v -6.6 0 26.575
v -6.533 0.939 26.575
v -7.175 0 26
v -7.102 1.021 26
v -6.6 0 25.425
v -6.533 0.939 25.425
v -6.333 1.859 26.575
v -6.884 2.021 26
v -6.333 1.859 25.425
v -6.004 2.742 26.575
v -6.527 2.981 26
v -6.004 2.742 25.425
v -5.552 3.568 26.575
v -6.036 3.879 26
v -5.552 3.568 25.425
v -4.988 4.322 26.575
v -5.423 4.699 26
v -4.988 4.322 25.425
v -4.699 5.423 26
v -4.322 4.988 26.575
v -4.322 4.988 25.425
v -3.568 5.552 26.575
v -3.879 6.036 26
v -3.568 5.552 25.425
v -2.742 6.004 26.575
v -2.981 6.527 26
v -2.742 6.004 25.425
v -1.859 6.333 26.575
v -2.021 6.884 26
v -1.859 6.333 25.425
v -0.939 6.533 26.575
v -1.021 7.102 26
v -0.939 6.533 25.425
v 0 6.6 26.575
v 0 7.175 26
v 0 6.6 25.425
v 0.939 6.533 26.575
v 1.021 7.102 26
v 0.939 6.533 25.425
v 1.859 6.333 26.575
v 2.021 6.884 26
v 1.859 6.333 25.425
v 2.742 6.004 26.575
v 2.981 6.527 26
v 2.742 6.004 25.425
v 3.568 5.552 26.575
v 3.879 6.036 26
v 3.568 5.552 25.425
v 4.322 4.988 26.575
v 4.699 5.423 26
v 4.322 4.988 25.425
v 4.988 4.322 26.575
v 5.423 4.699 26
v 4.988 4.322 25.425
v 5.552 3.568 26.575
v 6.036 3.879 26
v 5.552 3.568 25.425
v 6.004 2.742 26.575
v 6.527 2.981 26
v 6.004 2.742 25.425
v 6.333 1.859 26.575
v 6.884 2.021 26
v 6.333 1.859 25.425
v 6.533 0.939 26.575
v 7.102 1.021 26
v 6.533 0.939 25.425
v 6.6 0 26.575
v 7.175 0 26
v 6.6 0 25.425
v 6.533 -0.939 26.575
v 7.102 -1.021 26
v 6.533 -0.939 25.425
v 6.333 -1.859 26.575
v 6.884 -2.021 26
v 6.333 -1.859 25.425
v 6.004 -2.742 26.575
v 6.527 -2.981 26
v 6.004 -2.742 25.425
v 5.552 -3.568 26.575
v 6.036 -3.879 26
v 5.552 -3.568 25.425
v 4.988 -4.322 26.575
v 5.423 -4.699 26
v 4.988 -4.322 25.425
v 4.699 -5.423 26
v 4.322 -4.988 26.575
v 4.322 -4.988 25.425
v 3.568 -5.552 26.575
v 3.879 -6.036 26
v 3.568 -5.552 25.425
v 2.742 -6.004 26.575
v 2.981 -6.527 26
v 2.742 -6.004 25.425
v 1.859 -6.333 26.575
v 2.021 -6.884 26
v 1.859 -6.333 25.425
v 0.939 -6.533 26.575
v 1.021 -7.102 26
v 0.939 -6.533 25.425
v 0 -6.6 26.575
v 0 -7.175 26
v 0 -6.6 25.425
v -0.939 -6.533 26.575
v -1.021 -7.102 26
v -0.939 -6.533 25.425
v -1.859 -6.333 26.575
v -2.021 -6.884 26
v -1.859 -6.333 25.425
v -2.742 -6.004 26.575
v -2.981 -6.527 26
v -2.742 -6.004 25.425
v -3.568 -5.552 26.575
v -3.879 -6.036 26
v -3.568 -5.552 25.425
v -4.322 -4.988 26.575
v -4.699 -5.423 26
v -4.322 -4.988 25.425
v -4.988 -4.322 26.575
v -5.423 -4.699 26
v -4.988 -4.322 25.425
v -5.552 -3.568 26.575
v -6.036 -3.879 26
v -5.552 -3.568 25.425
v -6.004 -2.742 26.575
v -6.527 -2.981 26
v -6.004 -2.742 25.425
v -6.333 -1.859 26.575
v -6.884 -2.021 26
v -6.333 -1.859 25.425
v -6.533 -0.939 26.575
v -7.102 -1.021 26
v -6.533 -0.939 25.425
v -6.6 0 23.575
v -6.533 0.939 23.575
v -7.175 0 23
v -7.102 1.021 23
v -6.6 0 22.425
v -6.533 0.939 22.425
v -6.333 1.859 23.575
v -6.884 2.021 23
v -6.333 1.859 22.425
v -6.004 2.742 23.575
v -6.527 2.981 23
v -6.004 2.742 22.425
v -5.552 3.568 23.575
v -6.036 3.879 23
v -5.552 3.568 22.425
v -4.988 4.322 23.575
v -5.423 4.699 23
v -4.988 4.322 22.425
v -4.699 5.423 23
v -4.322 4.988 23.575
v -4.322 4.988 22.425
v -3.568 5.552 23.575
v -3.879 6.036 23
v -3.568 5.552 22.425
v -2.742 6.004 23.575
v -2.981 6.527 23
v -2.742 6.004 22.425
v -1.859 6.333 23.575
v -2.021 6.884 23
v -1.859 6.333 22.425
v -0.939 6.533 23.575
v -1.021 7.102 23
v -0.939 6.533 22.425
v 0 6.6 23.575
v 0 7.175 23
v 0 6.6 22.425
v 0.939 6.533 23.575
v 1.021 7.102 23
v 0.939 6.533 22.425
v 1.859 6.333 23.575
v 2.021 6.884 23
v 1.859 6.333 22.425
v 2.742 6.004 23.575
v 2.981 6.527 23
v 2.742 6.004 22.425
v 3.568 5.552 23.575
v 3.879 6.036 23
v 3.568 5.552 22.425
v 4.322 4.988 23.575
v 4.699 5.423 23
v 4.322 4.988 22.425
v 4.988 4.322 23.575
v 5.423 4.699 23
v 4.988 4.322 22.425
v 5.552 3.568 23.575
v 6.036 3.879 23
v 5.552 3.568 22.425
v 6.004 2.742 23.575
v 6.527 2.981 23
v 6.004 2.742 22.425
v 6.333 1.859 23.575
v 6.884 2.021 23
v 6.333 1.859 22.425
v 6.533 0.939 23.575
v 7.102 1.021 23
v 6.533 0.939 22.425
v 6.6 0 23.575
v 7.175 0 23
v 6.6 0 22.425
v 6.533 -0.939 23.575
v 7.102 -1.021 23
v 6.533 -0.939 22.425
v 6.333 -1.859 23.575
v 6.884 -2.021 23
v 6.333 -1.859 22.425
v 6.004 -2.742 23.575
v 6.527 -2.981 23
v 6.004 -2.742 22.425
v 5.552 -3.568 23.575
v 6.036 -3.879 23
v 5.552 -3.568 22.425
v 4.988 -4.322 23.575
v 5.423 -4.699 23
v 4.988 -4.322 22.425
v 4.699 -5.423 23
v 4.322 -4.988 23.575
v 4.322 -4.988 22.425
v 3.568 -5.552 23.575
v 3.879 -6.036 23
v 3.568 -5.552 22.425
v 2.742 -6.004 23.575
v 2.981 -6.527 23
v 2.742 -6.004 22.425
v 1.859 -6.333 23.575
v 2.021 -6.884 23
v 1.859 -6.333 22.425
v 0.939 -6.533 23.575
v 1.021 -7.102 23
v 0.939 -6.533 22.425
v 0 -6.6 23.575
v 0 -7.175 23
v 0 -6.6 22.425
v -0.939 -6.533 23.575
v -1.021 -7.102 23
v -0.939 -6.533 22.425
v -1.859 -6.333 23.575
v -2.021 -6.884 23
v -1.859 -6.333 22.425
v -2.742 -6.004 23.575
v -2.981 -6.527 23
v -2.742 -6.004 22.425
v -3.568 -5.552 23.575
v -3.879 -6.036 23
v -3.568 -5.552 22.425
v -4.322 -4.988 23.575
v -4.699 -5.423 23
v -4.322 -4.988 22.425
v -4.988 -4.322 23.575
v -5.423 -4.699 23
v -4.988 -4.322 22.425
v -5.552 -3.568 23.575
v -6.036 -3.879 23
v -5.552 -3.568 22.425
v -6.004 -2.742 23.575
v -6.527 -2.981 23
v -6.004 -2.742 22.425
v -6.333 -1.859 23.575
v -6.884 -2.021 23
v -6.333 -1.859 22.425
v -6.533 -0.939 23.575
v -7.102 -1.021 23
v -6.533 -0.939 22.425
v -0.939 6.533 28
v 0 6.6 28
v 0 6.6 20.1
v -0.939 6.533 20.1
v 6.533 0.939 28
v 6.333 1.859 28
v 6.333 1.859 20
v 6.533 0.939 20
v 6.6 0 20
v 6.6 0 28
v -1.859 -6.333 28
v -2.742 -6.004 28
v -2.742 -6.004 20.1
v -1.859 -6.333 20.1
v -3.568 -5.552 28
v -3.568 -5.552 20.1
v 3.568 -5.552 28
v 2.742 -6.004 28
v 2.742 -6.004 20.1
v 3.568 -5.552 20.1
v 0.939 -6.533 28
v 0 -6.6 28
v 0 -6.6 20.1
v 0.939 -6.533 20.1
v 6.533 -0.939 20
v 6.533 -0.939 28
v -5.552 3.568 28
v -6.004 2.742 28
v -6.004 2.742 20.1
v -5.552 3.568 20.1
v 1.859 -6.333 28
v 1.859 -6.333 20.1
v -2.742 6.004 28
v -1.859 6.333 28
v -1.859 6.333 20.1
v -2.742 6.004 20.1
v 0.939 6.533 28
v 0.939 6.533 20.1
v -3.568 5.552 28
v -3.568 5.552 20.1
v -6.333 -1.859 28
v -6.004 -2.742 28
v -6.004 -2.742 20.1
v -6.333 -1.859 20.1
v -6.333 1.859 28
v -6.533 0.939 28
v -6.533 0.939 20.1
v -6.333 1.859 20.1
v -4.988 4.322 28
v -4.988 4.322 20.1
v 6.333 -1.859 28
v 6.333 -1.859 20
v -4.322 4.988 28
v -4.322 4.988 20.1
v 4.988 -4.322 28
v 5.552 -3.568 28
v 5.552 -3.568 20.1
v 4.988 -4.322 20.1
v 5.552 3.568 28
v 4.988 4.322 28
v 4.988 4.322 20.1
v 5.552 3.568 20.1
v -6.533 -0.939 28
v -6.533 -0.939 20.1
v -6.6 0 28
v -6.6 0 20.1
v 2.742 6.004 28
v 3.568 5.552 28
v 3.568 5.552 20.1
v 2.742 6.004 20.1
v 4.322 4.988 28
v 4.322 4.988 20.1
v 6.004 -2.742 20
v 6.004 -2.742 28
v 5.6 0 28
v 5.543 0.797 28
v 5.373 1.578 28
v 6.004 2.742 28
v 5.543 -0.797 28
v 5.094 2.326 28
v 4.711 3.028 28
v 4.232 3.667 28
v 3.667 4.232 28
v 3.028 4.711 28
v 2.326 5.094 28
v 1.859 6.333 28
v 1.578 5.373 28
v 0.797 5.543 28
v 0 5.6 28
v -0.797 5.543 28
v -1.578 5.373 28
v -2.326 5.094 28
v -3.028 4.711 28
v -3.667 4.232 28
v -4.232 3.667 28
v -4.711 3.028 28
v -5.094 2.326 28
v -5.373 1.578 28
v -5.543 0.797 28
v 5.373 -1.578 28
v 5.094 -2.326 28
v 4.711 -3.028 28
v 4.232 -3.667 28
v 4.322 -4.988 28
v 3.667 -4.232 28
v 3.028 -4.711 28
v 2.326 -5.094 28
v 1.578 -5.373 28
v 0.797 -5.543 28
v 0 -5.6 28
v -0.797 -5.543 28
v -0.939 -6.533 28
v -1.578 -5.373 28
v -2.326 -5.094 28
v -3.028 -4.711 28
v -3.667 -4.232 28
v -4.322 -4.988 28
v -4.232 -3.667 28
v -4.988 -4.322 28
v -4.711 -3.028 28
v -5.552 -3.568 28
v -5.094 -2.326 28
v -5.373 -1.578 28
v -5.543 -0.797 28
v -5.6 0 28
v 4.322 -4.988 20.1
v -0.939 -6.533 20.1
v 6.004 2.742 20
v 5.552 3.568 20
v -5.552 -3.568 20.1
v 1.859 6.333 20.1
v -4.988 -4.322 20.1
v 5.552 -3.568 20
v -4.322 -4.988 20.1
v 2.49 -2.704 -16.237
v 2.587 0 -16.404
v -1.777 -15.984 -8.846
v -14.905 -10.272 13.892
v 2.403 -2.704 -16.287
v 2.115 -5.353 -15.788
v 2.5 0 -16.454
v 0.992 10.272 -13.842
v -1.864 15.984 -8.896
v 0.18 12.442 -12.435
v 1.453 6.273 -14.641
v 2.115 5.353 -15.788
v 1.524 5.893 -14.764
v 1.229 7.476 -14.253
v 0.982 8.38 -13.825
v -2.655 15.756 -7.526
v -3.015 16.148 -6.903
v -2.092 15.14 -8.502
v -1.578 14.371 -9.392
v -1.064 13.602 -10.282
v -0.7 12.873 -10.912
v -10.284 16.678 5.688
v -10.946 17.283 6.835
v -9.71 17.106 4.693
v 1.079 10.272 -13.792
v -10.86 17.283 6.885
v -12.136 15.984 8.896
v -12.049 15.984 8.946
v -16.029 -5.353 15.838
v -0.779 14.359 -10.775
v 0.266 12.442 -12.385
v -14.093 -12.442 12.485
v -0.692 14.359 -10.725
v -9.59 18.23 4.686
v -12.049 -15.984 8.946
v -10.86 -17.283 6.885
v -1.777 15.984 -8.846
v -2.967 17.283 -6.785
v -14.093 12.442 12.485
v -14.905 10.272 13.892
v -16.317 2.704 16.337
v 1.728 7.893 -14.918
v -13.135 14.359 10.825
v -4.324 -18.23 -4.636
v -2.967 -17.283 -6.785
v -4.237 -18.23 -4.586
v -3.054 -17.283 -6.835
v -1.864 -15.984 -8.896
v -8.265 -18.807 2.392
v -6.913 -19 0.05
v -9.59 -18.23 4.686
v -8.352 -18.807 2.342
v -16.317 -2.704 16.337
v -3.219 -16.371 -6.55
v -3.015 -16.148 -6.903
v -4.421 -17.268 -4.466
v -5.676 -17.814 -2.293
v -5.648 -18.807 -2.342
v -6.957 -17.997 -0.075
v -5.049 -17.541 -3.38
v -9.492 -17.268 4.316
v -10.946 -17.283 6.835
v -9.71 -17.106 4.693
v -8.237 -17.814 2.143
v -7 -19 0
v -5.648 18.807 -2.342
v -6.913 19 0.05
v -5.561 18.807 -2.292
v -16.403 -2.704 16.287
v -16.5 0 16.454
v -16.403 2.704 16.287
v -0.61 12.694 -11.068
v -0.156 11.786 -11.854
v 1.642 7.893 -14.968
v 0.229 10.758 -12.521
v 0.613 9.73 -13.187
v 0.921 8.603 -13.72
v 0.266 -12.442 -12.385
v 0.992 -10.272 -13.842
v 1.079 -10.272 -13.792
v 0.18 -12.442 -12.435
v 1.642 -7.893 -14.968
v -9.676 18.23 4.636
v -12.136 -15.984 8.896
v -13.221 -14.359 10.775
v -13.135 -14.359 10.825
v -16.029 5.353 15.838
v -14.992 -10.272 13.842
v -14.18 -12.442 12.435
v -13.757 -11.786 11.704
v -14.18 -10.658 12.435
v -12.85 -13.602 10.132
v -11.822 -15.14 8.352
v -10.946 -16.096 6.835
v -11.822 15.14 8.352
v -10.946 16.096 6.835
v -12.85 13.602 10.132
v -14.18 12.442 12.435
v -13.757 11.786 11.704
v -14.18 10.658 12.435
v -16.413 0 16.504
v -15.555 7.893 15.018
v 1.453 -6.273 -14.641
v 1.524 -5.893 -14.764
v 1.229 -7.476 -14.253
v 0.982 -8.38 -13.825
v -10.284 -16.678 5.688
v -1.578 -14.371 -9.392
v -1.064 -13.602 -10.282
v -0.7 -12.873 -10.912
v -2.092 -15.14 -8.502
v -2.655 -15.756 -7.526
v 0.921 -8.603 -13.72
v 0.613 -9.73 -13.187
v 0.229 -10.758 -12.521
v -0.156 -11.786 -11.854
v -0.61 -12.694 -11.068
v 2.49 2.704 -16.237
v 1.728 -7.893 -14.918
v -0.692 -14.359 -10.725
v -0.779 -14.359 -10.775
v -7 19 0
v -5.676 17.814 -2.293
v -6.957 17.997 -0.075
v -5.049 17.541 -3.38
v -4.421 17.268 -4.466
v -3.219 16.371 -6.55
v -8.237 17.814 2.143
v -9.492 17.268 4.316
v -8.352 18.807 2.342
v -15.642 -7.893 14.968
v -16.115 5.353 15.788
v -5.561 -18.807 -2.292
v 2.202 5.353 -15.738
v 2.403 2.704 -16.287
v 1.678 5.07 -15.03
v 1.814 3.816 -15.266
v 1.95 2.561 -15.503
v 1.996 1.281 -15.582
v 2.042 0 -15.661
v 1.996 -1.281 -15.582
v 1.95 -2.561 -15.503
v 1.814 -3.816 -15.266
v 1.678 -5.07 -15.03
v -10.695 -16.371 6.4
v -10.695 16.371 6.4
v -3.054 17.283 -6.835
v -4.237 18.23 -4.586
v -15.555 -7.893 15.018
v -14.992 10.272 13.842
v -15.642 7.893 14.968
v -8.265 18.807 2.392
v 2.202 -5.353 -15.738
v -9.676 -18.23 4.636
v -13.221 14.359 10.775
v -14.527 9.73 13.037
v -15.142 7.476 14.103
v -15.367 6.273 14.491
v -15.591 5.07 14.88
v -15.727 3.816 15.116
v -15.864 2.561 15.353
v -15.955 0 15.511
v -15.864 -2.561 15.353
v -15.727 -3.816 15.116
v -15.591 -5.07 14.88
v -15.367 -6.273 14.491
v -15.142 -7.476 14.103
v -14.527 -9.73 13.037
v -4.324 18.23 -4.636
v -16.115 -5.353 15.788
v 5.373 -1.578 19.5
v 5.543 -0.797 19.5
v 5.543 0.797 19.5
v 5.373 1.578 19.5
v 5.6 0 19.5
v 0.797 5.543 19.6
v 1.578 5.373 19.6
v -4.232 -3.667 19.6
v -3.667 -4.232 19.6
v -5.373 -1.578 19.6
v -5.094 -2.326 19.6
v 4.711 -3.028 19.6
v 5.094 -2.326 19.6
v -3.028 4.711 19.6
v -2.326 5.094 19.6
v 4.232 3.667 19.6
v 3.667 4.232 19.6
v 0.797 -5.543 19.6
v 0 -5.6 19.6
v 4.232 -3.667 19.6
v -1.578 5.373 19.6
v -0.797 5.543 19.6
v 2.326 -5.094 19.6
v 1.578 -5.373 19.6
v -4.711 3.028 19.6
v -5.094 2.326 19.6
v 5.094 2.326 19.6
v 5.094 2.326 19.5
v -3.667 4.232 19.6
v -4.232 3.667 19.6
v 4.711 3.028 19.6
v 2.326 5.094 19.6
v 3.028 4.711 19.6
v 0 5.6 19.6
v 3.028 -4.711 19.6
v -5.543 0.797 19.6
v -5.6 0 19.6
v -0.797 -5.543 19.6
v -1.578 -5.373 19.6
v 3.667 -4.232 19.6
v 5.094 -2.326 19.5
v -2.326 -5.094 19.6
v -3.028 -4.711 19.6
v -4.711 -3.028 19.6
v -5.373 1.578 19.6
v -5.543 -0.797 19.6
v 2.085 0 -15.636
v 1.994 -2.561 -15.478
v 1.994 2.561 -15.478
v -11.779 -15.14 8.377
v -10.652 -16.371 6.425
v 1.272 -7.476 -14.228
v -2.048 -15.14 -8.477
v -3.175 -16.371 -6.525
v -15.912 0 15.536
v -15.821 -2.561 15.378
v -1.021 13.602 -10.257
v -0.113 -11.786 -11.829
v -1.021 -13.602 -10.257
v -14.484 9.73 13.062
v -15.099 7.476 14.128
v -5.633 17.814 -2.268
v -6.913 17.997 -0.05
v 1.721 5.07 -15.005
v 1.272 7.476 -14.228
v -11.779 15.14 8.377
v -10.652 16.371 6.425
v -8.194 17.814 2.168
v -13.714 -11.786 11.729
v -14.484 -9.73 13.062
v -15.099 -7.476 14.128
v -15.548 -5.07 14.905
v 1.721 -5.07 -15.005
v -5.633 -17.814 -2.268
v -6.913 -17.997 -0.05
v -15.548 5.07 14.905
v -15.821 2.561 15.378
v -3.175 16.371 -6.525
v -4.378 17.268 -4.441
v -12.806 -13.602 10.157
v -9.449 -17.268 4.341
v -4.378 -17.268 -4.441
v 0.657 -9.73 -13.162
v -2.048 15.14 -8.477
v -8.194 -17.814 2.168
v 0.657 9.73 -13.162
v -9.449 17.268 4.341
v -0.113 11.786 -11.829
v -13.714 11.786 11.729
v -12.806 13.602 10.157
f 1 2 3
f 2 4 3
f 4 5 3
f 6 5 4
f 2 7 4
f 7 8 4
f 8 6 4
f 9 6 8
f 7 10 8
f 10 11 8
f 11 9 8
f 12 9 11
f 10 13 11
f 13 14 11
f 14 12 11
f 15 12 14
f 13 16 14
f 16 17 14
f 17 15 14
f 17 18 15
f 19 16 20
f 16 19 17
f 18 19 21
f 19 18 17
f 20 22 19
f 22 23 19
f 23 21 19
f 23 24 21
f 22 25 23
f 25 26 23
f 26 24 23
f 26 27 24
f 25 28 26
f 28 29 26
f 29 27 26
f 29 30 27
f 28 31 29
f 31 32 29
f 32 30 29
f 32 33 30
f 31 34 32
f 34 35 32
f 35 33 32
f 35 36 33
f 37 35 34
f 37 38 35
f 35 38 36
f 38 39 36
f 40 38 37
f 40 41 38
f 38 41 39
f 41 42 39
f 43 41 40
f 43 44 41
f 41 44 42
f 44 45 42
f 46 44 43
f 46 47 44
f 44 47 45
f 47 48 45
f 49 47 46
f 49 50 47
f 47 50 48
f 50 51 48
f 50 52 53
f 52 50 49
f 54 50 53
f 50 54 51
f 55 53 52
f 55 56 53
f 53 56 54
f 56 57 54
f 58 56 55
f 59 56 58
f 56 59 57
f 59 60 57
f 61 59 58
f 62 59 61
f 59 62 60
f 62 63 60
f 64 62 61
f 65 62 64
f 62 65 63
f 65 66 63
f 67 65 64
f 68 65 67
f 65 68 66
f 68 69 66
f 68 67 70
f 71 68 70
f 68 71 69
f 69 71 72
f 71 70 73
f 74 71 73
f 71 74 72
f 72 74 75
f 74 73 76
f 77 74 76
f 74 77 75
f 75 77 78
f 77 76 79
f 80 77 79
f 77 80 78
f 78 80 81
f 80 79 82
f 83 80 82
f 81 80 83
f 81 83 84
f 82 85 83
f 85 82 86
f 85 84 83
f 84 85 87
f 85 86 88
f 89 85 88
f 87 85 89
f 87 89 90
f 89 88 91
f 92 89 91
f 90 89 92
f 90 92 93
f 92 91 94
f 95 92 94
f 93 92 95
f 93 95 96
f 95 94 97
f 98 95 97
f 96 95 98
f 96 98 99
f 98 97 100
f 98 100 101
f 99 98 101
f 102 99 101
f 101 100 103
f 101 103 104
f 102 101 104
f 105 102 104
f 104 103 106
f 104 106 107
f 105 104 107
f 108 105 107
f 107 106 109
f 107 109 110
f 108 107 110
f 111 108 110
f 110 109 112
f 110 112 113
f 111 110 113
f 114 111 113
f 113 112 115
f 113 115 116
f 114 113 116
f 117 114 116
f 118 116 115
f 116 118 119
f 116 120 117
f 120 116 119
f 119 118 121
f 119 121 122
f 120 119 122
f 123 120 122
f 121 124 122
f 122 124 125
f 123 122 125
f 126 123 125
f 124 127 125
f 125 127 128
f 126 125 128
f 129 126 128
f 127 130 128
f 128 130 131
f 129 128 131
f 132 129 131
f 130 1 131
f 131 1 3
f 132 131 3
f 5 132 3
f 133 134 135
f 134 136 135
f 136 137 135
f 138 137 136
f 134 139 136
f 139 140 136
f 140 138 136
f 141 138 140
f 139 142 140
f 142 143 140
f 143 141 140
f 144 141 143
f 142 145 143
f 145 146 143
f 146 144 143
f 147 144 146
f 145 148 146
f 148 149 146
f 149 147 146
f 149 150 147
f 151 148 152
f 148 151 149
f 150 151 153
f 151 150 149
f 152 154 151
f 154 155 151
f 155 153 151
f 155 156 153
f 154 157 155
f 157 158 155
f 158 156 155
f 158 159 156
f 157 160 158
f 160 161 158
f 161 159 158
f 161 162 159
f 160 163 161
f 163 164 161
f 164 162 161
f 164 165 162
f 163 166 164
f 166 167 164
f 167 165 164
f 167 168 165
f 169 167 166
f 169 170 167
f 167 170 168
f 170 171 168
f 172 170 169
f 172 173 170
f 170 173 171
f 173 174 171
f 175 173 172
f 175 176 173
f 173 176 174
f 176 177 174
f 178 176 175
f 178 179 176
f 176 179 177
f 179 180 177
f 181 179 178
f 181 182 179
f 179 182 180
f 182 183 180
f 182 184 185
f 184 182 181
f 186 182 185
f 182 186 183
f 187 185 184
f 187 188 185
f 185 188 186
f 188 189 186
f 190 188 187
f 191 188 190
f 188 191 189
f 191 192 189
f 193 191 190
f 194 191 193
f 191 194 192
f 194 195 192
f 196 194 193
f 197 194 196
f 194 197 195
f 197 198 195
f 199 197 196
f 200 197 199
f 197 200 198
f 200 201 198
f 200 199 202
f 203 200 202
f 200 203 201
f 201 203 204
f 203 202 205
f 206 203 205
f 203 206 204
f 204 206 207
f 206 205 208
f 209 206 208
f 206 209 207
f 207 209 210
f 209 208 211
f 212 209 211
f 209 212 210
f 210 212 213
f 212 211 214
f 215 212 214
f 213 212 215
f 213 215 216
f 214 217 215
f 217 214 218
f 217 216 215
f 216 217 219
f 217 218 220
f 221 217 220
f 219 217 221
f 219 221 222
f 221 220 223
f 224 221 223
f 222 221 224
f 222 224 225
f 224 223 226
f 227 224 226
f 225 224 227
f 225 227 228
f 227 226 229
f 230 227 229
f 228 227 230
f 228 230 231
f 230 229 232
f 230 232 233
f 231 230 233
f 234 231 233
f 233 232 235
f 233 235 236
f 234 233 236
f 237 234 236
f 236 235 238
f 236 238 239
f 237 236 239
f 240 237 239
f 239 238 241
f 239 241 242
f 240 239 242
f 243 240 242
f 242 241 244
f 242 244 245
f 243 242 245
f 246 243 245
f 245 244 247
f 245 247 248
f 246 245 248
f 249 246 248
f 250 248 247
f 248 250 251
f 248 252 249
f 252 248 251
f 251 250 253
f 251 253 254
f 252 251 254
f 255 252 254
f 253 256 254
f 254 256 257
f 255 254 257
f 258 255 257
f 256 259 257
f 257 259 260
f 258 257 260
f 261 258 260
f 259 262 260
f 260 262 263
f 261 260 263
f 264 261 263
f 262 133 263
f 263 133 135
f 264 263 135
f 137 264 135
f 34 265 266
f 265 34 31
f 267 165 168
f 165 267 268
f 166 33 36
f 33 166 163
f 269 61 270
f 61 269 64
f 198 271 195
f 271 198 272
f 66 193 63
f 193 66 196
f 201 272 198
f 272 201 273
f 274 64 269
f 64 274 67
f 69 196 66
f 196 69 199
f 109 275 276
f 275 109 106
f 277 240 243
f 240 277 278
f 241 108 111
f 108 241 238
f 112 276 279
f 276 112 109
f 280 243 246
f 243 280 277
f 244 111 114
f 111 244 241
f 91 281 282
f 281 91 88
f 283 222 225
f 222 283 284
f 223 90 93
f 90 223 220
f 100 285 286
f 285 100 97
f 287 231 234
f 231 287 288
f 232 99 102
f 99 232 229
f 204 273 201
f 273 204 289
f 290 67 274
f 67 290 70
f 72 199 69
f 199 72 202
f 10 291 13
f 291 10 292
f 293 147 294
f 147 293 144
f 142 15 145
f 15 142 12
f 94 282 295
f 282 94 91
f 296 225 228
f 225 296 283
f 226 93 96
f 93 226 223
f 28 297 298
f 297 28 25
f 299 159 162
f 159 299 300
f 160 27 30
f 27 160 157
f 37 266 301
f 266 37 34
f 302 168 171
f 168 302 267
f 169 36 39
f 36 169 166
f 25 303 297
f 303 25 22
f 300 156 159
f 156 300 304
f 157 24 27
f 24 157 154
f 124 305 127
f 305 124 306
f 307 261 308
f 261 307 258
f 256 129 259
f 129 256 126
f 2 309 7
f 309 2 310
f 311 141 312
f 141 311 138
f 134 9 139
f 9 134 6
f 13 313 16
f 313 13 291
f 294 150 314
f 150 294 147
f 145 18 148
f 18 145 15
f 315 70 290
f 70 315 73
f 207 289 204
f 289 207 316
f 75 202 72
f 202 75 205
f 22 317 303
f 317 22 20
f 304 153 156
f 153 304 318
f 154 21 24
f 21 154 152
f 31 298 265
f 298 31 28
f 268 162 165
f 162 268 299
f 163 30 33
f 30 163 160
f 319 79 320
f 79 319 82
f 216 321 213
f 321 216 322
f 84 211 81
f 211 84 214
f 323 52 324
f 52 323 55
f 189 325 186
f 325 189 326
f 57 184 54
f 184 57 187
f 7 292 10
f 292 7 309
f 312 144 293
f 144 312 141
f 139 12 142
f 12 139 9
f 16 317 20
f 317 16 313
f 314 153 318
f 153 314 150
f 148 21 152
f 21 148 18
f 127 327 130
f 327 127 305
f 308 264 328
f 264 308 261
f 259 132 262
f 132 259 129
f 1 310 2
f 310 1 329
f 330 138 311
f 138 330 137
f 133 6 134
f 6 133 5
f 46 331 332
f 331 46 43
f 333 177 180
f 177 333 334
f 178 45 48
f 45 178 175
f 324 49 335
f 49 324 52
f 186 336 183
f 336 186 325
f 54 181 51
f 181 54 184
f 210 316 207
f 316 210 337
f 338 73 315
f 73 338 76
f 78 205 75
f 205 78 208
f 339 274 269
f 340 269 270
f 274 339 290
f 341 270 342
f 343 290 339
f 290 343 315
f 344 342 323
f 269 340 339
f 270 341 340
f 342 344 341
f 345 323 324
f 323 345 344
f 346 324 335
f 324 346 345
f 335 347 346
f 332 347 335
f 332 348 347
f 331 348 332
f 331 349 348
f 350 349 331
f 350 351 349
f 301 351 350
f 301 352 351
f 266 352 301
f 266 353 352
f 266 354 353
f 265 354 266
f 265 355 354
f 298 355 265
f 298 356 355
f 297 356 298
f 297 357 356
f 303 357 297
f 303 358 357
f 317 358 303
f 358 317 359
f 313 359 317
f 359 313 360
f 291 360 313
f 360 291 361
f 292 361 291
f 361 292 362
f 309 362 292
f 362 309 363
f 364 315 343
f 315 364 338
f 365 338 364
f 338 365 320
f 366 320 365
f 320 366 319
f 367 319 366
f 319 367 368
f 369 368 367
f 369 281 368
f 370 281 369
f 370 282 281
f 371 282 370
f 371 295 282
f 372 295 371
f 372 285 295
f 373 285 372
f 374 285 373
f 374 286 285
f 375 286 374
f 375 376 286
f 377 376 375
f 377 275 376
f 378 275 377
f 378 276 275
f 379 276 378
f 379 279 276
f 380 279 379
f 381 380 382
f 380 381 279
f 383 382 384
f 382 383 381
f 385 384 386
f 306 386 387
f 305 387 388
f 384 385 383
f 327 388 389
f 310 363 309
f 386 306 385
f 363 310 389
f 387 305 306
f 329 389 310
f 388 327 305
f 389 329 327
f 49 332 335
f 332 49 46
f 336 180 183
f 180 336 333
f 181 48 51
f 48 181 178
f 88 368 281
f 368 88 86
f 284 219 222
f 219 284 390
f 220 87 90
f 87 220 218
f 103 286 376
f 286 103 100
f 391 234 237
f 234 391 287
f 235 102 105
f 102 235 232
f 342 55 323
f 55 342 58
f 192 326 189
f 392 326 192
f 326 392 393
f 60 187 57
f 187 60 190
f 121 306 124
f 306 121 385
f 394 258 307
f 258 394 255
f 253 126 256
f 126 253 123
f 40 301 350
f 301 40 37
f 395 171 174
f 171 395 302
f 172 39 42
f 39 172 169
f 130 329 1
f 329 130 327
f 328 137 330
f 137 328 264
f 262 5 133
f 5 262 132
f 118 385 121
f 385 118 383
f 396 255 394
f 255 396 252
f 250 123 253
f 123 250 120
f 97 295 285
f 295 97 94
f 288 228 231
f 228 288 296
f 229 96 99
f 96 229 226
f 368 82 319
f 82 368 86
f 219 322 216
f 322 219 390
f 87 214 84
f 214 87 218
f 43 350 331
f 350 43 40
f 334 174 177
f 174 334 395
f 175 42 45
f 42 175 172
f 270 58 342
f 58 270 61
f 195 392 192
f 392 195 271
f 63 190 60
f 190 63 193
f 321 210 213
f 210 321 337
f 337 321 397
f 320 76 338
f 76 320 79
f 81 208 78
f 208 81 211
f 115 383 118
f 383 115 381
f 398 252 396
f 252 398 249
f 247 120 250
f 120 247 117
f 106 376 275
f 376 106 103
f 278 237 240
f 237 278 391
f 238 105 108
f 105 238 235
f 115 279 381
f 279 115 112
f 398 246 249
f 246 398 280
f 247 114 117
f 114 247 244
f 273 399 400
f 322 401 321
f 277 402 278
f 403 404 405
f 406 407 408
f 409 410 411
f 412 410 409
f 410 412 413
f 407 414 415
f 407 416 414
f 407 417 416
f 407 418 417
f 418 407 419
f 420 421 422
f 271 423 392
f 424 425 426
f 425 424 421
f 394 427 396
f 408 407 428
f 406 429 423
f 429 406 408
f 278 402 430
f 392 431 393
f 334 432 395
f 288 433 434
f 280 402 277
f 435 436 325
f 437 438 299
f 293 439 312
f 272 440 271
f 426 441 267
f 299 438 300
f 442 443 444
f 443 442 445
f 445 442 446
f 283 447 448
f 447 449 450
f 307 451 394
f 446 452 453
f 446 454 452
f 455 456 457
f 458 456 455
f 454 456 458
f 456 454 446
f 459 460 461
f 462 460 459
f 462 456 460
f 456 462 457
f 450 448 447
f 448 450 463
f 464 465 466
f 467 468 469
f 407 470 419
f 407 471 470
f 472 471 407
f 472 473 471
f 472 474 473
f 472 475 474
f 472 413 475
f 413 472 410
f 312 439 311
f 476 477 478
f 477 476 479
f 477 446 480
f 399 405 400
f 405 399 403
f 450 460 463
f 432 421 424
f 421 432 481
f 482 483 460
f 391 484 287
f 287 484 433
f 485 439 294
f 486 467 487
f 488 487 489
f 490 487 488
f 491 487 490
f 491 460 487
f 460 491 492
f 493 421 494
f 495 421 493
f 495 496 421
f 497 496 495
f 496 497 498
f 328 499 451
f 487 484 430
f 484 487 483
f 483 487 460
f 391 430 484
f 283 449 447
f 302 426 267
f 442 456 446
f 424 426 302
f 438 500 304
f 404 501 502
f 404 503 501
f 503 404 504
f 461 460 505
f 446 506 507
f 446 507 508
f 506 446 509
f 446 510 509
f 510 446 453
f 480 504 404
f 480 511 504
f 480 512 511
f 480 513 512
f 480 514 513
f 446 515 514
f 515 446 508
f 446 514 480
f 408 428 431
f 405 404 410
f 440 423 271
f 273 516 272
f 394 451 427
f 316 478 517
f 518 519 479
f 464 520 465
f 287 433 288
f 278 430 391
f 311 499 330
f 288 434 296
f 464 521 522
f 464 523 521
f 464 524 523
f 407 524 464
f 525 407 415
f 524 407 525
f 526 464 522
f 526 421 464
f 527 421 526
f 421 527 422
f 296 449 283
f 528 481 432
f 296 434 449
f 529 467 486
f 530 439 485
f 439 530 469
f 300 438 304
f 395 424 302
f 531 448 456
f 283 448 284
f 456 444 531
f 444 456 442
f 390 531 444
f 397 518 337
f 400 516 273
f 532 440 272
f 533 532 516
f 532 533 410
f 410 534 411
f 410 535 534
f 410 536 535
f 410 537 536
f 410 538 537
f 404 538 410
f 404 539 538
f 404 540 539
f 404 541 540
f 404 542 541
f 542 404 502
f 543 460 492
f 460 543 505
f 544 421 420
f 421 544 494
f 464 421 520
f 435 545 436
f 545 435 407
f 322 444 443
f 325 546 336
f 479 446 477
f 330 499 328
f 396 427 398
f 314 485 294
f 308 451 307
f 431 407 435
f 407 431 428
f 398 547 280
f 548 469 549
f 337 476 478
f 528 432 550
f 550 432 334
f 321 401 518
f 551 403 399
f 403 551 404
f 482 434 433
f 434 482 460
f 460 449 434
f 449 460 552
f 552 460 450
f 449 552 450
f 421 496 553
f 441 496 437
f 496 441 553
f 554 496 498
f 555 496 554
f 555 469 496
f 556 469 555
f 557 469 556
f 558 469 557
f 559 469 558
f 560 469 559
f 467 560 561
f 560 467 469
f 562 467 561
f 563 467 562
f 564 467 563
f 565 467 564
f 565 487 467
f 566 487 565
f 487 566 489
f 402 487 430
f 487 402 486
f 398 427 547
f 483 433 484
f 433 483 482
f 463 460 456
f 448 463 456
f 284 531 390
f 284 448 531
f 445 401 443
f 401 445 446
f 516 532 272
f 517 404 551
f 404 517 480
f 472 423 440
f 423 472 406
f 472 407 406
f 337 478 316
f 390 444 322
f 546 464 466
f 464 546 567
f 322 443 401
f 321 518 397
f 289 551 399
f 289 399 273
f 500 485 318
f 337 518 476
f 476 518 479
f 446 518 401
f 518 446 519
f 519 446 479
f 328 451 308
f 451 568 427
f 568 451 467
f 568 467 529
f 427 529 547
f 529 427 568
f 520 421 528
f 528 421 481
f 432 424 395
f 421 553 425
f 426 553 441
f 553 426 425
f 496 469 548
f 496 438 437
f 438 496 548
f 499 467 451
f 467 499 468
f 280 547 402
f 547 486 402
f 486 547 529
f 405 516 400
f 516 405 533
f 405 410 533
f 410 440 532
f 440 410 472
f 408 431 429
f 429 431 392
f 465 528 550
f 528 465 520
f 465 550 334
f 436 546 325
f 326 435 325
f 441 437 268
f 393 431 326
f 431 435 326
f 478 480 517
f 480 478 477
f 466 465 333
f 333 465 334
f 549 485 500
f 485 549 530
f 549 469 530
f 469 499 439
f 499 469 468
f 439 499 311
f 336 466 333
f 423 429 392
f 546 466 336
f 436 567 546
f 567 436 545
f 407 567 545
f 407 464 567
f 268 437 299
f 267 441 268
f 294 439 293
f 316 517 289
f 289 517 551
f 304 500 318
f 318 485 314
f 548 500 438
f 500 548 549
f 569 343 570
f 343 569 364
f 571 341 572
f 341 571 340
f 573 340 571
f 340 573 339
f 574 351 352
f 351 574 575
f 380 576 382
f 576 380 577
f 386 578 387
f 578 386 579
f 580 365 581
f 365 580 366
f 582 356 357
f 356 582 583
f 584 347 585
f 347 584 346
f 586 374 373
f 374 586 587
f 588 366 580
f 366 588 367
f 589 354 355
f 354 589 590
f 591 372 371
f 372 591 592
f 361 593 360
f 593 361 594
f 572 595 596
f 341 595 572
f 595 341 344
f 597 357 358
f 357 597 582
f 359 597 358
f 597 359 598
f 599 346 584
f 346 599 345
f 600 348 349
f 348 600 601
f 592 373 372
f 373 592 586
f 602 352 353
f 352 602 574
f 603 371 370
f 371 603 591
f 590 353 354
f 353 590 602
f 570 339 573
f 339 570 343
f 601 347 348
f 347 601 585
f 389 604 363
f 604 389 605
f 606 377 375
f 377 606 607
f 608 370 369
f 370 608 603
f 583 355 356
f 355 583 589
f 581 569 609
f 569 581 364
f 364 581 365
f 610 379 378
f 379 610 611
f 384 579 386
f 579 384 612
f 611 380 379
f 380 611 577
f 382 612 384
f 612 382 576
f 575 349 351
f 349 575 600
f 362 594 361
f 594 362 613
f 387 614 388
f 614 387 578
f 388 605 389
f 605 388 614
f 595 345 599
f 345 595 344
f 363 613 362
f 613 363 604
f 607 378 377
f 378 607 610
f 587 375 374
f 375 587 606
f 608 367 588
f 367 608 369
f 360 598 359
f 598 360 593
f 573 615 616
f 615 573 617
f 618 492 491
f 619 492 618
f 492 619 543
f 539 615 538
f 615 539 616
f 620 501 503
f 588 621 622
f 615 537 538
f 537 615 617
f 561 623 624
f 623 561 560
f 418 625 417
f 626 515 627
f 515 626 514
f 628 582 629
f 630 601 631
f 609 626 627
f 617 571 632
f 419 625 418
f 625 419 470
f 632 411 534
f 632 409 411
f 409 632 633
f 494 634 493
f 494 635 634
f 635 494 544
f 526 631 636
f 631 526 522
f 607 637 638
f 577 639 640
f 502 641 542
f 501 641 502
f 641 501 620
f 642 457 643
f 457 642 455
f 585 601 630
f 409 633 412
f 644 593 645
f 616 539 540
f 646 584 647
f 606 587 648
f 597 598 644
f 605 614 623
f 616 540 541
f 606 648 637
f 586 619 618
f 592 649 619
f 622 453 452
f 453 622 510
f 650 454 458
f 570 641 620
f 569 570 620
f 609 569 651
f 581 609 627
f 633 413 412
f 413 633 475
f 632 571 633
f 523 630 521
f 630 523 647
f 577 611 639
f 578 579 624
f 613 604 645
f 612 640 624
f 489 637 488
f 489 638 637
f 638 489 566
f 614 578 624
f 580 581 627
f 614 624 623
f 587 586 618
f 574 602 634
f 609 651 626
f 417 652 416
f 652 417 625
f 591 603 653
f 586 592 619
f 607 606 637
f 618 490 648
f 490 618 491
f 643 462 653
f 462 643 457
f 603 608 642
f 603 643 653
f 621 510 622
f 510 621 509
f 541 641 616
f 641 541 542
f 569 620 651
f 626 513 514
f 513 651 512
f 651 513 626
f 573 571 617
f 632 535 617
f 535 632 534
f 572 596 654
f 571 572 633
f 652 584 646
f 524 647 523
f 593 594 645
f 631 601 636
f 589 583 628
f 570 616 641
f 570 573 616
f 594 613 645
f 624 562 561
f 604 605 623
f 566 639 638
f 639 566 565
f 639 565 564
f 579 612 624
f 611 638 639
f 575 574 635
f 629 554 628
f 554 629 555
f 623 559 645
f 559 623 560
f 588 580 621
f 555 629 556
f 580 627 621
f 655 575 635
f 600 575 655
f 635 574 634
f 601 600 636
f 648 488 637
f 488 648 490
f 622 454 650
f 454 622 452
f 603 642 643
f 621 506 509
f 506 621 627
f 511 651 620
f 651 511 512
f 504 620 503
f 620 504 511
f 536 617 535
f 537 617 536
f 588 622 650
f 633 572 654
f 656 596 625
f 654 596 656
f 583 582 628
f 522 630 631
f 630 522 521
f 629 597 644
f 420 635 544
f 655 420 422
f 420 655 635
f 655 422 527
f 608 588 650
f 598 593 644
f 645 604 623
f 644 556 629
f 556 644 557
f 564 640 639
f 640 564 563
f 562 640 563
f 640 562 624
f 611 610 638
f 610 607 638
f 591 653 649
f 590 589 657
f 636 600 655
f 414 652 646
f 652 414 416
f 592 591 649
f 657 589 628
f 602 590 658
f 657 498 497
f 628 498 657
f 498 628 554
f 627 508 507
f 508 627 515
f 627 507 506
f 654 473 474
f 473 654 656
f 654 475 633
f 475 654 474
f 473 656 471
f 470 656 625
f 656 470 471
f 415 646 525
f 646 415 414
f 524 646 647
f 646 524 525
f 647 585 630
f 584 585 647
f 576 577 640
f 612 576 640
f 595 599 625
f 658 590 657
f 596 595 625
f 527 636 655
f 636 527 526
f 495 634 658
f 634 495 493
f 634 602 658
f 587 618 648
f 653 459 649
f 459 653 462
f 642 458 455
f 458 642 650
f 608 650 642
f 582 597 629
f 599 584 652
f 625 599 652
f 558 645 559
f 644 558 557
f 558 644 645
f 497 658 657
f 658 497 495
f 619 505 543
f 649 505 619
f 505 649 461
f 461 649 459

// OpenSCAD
// M=mode 1=outer,2=inner,3=wall
module to_tube(M=3, ztube=20, tube=13.2, htube=8, wall=1,R=[0,0,0],T=[0,0,0])
{
    dex=2.3; trifl=3; lt=4; // tube grip extend, step, lock type 4/24
    w0=wall/10;
    dx=(M<2?0:wall);
    // outlet
    translate([0,0,ztube-dx/2])
        cylinder(d=tube-dx*2,h=htube+dx);
    // locks
    if (M==1) for(z=[0,trifl])
            translate([0,0,ztube+htube-2-z])
            rotate_extrude(convexity=5) 
                translate([tube/2,0])
                circle(r=(dex)/4,$fn=lt);  
    // transition
    hull() {
        translate([0,0,ztube-dx/2]) cylinder(d=tube-dx*2,h=w0);
        translate(-[0,0,(M<2?0:w0)]) translate(T)
        rotate(R)linear_extrude(height=w0)
        offset(delta=-dx)children();
    }
}

difference() {
    $fn=44;
    to_tube(1,R=[0,60],T=[-7,0]) circle(19);
    to_tube(2,R=[0,60],T=[-7,0]) circle(19);
    //cube(100);
}
